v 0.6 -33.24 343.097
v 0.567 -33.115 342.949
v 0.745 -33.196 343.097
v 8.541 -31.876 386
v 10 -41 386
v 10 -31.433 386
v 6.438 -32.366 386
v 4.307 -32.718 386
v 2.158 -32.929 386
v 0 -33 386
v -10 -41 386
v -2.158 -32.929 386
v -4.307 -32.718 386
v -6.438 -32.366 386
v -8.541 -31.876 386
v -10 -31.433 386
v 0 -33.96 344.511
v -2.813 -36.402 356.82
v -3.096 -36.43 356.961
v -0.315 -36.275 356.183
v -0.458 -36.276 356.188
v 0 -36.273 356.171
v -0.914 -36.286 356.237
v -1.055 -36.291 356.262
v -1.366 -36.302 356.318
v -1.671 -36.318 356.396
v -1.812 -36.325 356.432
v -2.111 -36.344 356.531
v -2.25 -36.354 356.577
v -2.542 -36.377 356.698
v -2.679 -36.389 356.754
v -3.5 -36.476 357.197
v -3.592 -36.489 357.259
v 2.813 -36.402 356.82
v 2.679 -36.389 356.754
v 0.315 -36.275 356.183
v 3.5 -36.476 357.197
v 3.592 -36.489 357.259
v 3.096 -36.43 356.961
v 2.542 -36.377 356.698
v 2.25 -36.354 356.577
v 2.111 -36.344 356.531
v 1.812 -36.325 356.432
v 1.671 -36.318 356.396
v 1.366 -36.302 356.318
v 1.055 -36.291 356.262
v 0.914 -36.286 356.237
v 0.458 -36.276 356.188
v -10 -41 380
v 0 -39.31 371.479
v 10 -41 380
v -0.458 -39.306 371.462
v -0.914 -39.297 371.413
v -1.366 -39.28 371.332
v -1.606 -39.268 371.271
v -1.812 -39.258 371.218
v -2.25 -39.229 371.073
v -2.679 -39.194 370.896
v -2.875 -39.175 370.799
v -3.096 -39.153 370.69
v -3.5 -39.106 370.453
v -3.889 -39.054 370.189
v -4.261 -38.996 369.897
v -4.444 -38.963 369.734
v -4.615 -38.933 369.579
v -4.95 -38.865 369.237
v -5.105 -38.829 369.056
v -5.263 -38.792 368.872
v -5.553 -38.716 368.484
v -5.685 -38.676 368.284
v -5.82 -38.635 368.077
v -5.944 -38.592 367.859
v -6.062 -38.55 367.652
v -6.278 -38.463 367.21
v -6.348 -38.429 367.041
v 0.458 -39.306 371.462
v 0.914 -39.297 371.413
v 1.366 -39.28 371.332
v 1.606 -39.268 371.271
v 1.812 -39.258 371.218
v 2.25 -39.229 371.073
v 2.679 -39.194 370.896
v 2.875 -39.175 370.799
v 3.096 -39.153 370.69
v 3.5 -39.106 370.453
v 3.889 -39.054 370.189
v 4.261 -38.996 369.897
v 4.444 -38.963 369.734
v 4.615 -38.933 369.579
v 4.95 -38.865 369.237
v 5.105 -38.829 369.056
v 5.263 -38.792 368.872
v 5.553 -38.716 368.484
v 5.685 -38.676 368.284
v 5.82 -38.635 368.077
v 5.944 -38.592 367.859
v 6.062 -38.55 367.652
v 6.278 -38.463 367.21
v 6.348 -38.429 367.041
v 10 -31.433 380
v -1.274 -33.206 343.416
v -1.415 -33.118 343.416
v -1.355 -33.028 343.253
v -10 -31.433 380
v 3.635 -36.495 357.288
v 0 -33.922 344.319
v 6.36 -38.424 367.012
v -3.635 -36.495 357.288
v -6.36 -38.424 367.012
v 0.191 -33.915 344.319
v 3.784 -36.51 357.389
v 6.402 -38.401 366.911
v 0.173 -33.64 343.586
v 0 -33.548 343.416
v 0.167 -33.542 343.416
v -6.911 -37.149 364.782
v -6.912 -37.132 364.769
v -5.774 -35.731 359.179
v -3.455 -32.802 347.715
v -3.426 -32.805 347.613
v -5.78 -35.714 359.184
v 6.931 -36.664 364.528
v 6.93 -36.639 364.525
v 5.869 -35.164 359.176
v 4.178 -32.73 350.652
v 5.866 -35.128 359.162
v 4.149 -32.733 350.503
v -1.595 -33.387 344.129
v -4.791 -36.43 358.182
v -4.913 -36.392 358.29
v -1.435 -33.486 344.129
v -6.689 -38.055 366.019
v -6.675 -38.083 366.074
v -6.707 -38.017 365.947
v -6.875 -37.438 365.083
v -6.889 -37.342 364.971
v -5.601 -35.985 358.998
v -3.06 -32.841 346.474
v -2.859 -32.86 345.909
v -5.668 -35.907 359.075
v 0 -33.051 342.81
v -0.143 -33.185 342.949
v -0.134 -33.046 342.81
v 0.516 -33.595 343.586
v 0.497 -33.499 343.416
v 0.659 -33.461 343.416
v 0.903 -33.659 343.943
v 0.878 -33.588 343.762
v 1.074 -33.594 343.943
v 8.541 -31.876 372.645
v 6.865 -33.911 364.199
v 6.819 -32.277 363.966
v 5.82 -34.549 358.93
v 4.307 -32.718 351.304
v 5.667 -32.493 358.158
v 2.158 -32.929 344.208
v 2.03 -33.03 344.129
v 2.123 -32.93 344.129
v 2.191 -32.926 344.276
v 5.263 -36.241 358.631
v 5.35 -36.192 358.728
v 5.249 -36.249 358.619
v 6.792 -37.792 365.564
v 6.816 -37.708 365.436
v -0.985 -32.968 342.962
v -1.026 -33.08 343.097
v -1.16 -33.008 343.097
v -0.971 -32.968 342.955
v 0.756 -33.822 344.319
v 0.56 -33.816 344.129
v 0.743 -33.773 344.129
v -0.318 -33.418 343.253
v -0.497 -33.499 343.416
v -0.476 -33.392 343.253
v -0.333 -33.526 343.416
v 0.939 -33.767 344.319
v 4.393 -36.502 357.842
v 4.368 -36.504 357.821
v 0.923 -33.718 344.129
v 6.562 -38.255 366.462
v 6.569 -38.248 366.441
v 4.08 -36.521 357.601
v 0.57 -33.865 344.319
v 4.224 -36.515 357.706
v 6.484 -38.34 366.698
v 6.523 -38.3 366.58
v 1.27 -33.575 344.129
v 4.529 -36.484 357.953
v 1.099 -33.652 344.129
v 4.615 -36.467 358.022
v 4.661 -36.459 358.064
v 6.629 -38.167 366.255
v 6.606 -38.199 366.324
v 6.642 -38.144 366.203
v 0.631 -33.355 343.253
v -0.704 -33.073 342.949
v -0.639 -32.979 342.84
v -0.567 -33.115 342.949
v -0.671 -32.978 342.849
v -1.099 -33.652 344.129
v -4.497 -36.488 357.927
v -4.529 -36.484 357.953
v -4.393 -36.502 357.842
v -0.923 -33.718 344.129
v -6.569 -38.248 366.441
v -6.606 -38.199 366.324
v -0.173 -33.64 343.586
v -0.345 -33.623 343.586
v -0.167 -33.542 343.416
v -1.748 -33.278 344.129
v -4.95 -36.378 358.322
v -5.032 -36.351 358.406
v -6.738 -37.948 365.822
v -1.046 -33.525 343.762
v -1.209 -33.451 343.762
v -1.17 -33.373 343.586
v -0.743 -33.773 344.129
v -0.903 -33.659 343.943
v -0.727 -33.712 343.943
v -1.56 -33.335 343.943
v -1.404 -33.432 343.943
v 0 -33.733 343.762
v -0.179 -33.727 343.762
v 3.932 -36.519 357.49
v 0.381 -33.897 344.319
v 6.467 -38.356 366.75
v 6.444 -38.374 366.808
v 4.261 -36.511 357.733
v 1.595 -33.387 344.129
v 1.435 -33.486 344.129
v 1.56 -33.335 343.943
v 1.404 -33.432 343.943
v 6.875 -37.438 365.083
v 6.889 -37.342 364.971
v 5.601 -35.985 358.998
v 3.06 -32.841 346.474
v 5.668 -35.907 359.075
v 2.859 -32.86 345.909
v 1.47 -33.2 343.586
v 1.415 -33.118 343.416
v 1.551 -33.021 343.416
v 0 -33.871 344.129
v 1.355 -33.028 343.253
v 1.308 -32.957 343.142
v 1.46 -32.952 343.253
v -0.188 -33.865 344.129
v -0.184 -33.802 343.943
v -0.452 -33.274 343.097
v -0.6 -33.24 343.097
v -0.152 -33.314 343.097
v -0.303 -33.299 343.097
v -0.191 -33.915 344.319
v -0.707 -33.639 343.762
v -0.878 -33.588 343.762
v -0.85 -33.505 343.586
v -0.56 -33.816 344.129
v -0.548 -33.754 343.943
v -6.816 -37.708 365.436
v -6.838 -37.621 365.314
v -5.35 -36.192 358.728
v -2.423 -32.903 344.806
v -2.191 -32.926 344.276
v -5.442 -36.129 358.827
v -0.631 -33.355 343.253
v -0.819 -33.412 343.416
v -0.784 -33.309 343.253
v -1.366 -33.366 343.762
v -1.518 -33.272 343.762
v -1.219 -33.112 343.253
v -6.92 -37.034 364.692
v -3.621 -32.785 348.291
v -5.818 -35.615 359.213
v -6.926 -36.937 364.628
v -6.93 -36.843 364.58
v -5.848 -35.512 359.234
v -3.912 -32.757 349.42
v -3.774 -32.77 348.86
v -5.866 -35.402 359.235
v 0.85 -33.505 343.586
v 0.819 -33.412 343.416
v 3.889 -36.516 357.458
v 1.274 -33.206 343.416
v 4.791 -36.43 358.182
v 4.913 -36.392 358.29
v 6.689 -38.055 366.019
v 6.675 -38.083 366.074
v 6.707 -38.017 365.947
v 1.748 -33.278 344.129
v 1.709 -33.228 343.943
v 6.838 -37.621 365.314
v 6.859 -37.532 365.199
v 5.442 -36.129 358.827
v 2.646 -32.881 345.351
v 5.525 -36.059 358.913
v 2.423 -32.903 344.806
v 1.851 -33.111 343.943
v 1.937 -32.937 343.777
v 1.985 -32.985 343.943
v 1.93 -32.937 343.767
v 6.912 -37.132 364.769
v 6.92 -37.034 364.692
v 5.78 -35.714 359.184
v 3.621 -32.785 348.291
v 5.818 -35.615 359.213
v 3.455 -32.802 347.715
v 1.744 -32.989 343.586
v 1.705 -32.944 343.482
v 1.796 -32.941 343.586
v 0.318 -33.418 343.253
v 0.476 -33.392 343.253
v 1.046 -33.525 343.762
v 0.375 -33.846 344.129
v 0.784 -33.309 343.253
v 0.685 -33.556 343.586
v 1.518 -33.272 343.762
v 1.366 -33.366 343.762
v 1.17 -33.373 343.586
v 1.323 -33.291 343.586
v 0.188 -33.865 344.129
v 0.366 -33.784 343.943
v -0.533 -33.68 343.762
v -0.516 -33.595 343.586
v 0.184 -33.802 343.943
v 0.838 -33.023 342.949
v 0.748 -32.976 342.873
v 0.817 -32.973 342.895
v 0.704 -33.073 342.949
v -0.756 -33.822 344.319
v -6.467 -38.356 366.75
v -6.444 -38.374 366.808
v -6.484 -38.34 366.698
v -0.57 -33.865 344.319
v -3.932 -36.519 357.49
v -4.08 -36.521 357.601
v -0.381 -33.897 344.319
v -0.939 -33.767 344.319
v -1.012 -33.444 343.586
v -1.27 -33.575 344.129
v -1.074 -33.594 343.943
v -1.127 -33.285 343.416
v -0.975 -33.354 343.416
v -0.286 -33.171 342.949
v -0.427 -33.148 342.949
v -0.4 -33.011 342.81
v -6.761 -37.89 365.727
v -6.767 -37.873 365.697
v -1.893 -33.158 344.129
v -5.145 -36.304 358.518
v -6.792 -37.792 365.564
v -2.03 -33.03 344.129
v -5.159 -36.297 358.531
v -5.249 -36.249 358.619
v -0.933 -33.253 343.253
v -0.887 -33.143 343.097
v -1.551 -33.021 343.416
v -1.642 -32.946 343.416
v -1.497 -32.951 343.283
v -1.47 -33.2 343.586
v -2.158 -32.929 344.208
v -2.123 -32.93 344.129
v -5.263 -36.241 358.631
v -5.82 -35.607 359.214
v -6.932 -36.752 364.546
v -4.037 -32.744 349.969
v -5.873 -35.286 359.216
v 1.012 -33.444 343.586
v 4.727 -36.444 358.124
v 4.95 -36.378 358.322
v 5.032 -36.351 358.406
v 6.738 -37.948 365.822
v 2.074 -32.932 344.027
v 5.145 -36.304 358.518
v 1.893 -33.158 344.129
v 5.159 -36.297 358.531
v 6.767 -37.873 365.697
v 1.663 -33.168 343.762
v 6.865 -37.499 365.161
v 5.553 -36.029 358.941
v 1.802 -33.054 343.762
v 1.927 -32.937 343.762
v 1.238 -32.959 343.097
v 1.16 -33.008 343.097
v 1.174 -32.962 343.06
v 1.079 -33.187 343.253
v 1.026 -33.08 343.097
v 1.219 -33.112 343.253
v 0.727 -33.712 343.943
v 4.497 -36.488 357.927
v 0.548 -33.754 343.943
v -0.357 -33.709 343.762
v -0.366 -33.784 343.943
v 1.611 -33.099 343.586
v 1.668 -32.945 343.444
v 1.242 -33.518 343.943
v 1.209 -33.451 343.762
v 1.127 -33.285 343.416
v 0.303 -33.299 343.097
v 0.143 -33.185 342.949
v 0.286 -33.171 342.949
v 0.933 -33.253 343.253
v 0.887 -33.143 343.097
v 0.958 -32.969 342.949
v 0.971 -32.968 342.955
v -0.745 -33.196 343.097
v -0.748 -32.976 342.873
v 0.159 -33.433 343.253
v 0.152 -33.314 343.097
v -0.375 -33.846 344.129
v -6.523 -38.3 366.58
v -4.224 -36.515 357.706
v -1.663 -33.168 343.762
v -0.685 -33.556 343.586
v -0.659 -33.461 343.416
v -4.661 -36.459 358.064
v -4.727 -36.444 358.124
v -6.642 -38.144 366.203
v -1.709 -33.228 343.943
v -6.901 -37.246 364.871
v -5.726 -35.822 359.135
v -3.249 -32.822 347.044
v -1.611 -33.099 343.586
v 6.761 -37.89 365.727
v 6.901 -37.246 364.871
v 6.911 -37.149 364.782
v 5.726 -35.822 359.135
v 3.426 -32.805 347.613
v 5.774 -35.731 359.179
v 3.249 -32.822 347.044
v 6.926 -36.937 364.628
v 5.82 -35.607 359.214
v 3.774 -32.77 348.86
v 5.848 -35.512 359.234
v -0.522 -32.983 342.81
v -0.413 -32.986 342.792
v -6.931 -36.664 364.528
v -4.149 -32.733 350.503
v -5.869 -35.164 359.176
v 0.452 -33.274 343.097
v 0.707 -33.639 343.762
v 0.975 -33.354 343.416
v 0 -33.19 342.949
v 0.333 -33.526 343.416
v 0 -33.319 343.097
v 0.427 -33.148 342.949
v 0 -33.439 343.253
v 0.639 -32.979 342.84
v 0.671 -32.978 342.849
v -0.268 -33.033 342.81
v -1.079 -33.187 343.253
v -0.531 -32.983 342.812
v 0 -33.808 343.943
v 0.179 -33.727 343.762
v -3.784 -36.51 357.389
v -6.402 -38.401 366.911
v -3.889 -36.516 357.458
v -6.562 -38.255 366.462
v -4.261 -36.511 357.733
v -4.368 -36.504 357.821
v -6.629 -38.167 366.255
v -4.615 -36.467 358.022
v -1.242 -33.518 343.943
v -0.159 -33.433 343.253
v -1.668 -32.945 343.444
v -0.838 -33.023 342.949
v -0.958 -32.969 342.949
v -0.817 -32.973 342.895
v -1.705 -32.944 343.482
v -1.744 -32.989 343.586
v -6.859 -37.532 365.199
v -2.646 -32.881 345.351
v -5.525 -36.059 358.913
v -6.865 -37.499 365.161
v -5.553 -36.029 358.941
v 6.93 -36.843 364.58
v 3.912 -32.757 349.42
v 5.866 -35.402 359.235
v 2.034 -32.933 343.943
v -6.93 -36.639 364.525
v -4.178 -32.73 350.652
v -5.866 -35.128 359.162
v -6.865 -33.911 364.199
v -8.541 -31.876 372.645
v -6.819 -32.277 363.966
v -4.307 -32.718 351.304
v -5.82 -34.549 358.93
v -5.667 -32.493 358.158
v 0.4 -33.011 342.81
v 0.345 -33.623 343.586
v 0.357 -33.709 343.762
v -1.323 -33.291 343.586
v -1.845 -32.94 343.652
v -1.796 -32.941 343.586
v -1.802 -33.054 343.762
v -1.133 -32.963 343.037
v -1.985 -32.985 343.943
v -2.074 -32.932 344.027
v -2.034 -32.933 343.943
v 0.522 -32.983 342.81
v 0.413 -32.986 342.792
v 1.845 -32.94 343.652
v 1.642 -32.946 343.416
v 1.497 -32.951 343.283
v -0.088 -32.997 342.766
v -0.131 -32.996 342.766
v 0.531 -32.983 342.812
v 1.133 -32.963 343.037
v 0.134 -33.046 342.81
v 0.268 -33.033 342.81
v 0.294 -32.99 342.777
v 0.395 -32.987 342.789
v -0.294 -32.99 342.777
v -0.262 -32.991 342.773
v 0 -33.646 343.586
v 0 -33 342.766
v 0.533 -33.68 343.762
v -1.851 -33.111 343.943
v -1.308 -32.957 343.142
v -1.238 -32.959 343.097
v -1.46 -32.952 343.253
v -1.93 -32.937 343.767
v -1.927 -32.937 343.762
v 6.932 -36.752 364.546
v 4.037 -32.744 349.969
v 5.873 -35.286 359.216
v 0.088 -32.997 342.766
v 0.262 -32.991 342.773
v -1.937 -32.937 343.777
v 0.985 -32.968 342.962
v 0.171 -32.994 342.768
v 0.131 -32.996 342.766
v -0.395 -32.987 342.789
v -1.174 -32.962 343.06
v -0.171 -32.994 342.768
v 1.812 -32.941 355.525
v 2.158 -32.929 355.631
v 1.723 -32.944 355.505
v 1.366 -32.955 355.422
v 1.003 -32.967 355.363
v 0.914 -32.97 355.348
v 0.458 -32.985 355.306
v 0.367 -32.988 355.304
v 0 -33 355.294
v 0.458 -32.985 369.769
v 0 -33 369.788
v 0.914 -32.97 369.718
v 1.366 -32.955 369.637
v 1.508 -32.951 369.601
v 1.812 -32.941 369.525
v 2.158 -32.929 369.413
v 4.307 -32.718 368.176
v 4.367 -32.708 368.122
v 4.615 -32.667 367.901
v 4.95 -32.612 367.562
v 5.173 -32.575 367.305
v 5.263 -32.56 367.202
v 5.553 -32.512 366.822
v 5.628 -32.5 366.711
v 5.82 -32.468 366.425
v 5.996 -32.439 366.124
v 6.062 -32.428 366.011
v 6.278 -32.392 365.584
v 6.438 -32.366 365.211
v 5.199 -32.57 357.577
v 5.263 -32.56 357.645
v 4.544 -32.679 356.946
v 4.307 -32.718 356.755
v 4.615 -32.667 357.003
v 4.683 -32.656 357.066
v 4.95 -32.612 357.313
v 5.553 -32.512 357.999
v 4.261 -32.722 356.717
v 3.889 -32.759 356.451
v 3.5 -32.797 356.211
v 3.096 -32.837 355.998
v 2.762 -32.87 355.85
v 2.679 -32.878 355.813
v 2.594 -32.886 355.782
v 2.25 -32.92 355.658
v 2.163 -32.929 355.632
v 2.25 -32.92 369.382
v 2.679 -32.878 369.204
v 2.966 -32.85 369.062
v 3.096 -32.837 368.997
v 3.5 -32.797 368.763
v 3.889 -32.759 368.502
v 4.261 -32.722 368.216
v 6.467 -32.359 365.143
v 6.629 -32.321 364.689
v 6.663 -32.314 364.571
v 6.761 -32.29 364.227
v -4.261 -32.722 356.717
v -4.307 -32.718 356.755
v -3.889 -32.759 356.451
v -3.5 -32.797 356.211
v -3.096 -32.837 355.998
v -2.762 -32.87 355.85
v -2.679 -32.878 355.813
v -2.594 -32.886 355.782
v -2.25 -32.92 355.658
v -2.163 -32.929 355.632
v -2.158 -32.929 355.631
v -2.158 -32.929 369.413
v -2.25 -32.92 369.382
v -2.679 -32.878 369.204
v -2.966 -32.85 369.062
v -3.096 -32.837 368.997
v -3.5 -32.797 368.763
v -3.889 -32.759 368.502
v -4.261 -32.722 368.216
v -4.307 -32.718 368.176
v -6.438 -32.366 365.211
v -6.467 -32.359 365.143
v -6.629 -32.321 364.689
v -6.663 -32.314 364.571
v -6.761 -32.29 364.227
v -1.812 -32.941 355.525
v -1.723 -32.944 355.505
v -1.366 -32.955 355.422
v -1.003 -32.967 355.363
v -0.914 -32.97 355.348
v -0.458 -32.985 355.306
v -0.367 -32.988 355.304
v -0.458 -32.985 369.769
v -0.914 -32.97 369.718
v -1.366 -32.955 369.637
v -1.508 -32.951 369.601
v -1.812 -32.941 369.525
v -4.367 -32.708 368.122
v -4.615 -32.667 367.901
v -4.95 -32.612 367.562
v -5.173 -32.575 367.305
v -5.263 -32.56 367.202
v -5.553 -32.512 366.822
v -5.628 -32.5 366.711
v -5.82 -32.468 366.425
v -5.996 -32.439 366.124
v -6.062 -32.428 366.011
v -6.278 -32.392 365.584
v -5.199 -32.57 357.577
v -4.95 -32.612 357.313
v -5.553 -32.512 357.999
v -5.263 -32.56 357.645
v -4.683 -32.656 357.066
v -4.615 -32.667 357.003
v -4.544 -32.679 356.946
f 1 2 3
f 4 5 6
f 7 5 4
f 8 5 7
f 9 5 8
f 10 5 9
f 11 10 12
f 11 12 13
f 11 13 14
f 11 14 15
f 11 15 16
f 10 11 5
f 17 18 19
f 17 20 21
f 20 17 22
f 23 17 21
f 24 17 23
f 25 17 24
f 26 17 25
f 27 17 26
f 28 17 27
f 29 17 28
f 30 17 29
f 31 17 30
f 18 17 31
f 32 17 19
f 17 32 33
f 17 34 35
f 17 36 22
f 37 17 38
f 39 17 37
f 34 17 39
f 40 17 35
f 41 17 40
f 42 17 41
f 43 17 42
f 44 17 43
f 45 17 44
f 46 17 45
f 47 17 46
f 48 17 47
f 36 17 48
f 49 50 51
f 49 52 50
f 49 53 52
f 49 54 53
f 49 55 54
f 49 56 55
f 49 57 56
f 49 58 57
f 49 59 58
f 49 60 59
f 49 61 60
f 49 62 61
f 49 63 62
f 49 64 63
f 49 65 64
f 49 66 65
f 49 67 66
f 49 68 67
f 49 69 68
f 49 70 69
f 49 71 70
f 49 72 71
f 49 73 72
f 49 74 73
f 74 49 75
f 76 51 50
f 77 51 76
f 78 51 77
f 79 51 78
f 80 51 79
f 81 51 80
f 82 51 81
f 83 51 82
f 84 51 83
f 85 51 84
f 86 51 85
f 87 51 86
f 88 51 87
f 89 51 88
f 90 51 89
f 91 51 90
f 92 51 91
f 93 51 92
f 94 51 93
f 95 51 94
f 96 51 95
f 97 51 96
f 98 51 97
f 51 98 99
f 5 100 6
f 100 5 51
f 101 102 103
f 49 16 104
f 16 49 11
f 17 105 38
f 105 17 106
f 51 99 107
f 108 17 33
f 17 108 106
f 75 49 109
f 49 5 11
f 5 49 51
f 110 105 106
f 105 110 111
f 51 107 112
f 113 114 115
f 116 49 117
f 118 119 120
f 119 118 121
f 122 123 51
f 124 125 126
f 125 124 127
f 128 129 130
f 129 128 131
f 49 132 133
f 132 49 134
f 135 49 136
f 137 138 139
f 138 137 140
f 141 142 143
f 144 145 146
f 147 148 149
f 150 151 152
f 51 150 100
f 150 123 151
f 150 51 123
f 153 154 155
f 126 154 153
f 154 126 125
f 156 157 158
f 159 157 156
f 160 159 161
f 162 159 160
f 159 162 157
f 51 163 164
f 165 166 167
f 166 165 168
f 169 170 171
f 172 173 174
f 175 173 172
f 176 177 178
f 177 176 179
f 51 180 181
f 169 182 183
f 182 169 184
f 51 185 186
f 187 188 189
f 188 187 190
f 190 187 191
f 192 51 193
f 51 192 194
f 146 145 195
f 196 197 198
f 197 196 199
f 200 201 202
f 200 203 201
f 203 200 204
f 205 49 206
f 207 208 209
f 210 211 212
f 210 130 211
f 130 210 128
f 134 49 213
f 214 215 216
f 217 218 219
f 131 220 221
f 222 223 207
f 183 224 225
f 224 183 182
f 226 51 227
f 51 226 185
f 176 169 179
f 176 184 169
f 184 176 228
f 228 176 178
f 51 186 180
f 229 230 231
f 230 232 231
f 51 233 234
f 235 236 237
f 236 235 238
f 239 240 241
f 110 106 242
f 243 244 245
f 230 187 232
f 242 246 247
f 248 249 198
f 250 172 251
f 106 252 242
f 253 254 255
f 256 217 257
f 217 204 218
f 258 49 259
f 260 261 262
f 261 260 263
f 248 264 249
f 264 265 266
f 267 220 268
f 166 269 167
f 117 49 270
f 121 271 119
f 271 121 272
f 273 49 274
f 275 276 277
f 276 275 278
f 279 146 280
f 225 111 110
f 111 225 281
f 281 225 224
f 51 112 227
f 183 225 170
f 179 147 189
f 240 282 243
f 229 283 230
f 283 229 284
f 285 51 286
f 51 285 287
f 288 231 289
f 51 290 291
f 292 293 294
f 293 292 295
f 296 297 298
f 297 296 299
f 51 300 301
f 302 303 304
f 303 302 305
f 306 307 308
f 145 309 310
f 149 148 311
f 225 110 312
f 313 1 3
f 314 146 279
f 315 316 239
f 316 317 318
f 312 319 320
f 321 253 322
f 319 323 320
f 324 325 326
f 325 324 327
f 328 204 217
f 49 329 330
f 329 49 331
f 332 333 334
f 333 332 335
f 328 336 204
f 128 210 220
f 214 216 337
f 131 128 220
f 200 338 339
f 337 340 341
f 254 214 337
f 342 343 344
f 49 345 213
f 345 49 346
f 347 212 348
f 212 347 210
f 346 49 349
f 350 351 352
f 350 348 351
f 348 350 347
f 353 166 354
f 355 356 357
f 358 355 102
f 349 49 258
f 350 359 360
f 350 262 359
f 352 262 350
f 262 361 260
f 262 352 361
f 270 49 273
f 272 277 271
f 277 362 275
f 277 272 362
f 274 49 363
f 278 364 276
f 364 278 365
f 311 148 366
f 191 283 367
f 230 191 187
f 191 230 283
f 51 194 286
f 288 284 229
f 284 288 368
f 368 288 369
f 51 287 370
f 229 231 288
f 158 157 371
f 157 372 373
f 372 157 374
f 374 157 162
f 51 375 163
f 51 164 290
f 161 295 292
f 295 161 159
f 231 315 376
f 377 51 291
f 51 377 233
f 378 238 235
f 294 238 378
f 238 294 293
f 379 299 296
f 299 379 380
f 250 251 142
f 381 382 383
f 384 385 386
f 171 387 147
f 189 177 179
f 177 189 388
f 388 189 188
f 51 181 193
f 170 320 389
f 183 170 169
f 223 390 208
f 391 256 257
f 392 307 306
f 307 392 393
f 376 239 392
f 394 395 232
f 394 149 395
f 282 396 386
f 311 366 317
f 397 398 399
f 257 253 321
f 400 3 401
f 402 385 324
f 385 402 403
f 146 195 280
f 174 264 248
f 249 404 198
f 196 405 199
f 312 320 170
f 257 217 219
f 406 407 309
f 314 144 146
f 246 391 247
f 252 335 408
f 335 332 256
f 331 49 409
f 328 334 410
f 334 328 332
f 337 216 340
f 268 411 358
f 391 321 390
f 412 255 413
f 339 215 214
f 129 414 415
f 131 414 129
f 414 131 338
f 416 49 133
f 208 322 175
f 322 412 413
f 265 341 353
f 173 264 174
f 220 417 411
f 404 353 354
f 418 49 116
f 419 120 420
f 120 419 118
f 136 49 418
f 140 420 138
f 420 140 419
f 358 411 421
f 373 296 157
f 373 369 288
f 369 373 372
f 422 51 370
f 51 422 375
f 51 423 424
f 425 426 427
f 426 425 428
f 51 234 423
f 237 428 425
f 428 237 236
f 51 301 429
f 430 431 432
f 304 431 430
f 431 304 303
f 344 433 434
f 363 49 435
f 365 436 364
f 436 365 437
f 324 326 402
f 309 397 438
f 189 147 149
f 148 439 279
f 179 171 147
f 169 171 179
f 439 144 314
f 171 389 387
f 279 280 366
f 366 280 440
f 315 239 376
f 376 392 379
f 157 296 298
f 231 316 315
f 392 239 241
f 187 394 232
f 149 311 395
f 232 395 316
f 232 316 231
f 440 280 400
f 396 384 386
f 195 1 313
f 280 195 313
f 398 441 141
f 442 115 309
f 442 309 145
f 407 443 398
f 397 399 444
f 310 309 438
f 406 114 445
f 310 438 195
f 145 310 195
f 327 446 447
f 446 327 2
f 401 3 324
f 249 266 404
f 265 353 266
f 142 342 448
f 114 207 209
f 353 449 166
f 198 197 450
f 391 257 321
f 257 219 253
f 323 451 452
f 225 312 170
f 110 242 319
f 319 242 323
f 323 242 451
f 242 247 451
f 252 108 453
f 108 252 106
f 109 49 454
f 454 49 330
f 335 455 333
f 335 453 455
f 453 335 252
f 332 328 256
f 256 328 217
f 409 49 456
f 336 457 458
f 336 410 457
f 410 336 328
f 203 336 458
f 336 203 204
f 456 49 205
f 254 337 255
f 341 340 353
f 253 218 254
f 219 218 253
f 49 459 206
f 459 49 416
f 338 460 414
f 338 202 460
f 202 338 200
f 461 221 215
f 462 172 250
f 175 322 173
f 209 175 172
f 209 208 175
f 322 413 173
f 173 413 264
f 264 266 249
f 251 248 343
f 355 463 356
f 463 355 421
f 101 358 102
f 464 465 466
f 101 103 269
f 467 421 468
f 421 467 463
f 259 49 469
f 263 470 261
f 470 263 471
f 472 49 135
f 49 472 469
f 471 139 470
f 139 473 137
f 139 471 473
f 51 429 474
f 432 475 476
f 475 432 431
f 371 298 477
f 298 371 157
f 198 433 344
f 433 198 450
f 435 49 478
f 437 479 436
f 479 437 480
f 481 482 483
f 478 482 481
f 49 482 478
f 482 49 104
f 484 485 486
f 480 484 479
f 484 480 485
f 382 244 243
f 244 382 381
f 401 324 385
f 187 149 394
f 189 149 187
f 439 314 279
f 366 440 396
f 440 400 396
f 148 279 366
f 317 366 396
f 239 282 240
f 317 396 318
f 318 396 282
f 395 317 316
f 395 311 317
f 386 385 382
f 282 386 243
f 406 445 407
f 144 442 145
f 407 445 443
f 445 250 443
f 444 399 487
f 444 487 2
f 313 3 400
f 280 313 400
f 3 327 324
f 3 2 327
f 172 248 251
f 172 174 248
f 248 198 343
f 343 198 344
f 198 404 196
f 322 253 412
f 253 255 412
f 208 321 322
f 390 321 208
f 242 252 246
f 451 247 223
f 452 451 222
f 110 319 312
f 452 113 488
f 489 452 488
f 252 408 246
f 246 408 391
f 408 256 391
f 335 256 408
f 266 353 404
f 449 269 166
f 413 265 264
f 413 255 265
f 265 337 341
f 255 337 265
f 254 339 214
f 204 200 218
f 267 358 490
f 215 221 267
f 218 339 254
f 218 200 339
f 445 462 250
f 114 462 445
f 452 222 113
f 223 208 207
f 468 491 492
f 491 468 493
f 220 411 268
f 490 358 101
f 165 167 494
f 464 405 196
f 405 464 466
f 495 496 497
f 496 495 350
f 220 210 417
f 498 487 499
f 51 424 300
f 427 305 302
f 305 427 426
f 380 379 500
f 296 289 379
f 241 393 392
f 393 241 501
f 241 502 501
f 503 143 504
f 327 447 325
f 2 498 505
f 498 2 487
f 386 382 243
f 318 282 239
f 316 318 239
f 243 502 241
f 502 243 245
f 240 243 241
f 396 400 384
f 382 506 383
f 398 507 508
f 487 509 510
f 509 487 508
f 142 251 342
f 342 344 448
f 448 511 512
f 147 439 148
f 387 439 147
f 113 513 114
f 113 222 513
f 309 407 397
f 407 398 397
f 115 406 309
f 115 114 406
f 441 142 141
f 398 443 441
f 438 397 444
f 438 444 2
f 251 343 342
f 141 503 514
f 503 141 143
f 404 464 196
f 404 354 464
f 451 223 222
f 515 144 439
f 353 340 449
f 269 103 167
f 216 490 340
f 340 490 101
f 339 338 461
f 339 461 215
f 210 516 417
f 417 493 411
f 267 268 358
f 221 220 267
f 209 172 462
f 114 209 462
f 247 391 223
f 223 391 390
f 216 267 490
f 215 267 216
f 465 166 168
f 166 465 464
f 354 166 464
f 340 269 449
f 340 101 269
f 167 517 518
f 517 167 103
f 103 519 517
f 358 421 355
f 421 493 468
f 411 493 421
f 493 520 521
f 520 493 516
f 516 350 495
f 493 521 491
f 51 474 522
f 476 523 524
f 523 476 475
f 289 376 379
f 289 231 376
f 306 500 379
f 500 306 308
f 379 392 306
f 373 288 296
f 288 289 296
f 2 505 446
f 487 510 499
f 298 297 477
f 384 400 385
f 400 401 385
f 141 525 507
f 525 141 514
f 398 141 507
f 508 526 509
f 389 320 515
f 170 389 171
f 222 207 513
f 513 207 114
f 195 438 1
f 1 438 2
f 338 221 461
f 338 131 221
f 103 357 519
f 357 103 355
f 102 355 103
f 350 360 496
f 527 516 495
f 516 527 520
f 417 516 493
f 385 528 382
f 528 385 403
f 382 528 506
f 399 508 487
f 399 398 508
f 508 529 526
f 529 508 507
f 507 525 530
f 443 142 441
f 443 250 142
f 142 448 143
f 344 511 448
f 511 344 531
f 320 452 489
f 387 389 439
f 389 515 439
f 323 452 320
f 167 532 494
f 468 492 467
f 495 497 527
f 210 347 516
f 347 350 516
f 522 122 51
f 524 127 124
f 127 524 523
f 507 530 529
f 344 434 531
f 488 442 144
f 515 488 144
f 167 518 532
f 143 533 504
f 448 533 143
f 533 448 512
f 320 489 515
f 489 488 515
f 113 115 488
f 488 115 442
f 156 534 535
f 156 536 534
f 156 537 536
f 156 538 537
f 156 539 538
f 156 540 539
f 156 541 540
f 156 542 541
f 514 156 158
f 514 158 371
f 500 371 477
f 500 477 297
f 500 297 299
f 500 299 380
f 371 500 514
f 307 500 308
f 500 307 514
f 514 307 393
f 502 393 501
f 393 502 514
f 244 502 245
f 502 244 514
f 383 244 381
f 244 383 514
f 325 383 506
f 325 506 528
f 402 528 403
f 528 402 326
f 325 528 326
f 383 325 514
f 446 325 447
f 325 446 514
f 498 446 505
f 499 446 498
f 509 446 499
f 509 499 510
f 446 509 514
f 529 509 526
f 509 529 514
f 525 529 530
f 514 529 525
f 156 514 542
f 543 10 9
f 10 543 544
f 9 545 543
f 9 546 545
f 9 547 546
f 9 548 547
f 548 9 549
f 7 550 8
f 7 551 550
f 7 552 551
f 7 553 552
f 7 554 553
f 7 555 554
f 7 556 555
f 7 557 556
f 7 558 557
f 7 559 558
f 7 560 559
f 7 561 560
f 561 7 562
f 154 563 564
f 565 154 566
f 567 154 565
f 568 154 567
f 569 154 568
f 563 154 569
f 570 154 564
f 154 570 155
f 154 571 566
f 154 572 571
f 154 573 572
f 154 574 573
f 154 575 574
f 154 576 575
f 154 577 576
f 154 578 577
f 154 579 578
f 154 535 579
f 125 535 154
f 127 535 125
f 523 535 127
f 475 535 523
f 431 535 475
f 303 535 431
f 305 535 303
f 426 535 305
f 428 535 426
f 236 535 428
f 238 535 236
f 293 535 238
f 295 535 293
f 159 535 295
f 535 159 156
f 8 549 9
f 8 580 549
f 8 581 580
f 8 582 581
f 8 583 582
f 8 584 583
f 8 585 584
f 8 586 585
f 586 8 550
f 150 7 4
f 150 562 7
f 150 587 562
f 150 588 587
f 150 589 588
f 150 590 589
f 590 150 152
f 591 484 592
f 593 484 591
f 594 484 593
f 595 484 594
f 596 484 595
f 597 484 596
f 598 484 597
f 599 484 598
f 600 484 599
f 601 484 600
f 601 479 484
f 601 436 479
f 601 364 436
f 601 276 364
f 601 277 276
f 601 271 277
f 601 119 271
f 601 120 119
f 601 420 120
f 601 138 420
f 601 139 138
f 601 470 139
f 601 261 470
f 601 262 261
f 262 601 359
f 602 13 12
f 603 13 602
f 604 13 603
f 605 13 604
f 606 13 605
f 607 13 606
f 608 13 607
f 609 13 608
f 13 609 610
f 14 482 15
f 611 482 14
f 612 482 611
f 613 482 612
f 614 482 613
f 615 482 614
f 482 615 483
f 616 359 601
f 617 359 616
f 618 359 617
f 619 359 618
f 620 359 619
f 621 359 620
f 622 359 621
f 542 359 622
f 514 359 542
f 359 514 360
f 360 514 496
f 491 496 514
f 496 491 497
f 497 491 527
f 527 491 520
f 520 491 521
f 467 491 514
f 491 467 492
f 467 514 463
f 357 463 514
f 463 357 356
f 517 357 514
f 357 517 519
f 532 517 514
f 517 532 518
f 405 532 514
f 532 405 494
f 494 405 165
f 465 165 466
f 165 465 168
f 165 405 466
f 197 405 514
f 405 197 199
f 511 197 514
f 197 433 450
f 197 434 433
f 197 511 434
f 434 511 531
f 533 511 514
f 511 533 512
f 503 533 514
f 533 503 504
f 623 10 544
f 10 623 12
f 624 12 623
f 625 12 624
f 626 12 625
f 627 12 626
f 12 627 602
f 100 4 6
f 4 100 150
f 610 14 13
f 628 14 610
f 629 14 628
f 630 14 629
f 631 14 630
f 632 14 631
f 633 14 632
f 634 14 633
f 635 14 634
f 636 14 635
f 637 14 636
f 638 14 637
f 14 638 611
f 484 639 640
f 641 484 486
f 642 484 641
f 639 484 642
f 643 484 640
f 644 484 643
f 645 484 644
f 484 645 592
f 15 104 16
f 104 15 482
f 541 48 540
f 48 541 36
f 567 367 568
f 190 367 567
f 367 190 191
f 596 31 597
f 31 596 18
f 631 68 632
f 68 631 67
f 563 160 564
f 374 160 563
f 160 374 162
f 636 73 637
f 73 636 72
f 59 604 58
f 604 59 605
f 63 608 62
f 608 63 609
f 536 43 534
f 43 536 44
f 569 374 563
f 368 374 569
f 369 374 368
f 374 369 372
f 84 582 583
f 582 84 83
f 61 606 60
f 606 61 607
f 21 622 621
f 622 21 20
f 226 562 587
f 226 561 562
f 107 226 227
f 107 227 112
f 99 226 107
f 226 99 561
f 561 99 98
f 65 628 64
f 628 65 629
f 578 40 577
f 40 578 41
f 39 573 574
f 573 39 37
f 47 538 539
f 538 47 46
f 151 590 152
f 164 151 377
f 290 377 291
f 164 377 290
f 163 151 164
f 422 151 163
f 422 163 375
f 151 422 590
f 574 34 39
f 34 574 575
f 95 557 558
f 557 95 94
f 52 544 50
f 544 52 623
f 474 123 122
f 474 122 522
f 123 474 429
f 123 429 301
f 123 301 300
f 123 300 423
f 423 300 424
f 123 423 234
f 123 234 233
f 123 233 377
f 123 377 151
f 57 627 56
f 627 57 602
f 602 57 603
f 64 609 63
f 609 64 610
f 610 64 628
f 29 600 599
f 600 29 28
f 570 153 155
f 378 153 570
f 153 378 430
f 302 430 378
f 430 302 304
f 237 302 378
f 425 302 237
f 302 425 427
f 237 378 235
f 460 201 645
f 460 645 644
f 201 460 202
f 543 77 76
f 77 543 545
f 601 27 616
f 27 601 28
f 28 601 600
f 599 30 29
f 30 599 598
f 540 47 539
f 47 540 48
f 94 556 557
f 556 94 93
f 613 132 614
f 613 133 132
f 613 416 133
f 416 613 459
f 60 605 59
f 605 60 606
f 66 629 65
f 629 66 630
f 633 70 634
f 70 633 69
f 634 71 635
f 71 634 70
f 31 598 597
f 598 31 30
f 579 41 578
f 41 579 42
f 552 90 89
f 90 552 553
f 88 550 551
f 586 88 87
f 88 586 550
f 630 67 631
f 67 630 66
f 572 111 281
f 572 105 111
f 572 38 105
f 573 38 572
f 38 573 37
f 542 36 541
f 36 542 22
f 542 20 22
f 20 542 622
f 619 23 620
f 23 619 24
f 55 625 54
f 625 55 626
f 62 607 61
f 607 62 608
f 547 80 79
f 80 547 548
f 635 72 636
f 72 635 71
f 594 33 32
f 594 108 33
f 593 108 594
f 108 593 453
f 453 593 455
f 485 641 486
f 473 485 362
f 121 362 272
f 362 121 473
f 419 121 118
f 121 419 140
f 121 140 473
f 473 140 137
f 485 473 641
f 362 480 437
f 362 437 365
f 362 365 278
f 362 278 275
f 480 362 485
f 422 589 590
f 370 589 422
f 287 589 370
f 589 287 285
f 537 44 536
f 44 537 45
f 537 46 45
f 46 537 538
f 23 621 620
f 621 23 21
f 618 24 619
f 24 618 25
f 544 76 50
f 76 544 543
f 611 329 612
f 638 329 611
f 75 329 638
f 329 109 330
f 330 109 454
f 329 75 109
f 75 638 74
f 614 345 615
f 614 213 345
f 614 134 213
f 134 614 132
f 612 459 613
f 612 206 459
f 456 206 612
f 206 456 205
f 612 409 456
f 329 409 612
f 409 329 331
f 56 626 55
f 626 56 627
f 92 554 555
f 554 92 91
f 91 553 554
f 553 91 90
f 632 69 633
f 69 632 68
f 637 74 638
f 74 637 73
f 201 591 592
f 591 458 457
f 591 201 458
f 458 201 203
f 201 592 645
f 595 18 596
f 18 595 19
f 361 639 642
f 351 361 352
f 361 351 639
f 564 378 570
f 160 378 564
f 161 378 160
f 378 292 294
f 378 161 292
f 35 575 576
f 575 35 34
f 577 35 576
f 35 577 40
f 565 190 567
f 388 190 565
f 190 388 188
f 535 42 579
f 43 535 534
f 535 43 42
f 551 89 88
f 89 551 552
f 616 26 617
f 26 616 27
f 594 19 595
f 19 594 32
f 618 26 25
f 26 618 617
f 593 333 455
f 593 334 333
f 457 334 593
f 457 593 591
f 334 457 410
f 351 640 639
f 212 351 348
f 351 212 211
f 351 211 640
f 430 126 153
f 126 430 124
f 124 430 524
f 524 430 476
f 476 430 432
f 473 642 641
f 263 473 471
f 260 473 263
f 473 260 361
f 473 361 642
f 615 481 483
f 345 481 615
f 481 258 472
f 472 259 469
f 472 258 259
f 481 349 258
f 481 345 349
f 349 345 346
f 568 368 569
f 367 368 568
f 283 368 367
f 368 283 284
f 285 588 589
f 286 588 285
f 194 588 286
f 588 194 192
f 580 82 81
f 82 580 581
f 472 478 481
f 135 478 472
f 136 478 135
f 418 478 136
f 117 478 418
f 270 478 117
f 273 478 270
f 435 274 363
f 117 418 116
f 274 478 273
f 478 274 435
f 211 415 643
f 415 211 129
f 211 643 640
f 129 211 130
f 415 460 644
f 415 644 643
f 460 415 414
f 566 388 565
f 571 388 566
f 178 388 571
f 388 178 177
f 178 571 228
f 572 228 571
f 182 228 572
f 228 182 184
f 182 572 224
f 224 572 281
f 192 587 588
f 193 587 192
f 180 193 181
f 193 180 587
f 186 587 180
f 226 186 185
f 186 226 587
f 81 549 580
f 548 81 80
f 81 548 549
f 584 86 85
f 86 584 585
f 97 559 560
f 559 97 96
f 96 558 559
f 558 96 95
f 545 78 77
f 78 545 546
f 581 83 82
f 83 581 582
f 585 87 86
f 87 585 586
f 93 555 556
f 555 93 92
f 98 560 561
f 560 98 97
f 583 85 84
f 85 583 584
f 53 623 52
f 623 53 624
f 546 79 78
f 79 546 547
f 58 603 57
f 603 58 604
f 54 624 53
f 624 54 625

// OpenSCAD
// file: ../lib/astra66_core.scad
// =============================================================================
// ASTRA-66 CAD rev B -- core library
// Parameters (generated from analysis.py by build.py), derived stations and helpers.
// Every part file includes this; stations mirror analysis.py X[] exactly.
//
// Frame: rocket axis = +Z, STA 0 = nose tip, stations increase aft.
// Angles: measured about +Z from +X toward +Y.  90 deg = switch / hatch side,
// 270 deg = camera side, 45 deg = rail-button line, fins at 0/90/180/270 deg.
// =============================================================================
include <../astra66_params.scad>

$fn = FN;
EPS = 0.01;
CAD_REV = "B";

// ----------------------------------------------------------------- radii
R_OD    = BODY_OD / 2;                 // body tube outer
R_ID    = BODY_ID / 2;                 // body tube inner
R_SH    = (BODY_ID - FIT_SH) / 2;      // printed shoulder / ring OD radius
R_SI    = R_SH - NC_SH_WALL;           // nose shoulder inner radius
R_CO    = CPL_OD / 2;                  // coupler outer
R_CI    = CPL_ID / 2;                  // coupler inner
R_BH_IN = (CPL_ID - 0.2) / 2;          // inner bulkhead disc (fits in coupler)
R_MO    = MMT_OD / 2;
R_MI    = MMT_ID / 2;
R_RING_BORE = (MMT_OD + FIT_SH) / 2;   // centering-ring / core bore
R_TAB_FLOOR = max(R_MO, RET_CLEAR_D / 2);          // rev B: tab clears the COTS retainer
FIN_TAB_H   = R_OD - R_TAB_FLOOR - FIN_TAB_CLR;

// ----------------------------------------------------------------- stations
X_NC_BASE     = NC_L;
X_SH_END      = NC_L + NC_SH_L;
X_PL_END      = NC_L + PL_L;
X_BAND_END    = X_PL_END + AV_BAND_L;
X_END         = X_BAND_END + BO_L;
L_OVERALL     = X_END;                              // airframe length (excl. COTS retainer)
X_CPL_FWD     = X_PL_END - AV_INS;
X_CPL_AFT     = X_BAND_END + AV_INS;
X_AVB_FWD_OUT = X_CPL_FWD - AV_BH_T;                // AV-303 forward face
X_AVB_AFT_OUT = X_CPL_AFT + GASKET_T;               // AV-304 outer-disc forward face
X_AVB_AFT_END = X_AVB_AFT_OUT + AV_BH_T;            // AV-304 aft face (recovery bay starts)
X_SLED_FWD    = X_CPL_FWD + AV_BH_T + SLED_FWD_GAP;
X_SLED_AFT    = X_SLED_FWD + SLED_L;
X_MMT_AFT     = X_END + MMT_AFT_EXT;
X_MMT_FWD     = X_MMT_AFT - MMT_L;
X_FIN_LE      = X_END - FIN_CR;
X_TAB_FWD     = X_FIN_LE + FIN_TAB_FWD;
X_TAB_AFT     = X_END - LOCK_T;
X_CORE_FWD    = X_TAB_FWD - CORE_RING_T;
X_CORE_AFT    = X_END - LOCK_T;
X_NC_SCREW    = NC_L + NC_SH_L / 2;
X_CAM         = X_SH_END + CAM_OFF;
X_HATCH       = X_SH_END + HATCH_OFF;
X_RB_FWD      = X_MMT_FWD - RB_FWD_OFF;
X_RB_AFT      = X_END - RB_AFT_OFF;
X_TRAY_FWD    = X_AVB_FWD_OUT - TRAY_L;
X_SW          = X_PL_END + AV_BAND_L / 2;
X_MOTOR_FWD   = X_MMT_AFT - MOTOR_L;
X_BAT0        = X_SLED_FWD + 2;
BAT_CAGE_L    = 12 + BAT_L + 0.6;
PAYLOAD_BAY_L  = X_AVB_FWD_OUT - X_SH_END;
RECOVERY_BAY_L = X_MMT_FWD - X_AVB_AFT_END;

FIN_ANGLES      = [for (i = [0 : FIN_N - 1]) i * 360 / FIN_N];
LOCK_SCREW_ANG  = [45, 135, 225, 315];
STATIC_PORT_ANG = [45, 135, 225, 315];

// ----------------------------------------------------------------- geometry helpers
function ogive_rho()  = (R_OD * R_OD + NC_L * NC_L) / (2 * R_OD);
function ogive_r(x)   = sqrt(max(pow(ogive_rho(), 2) - pow(NC_L - x, 2), 0)) + R_OD - ogive_rho();

// Solid of revolution of the tangent ogive between stations x0..x1, radially offset inward by off.
module ogive_solid(x0, x1, off = 0, n = 72) {
    s = (x0 == 0) ? 1 : 0;
    rotate_extrude()
        polygon(concat([[0, x0]],
                       [for (i = [s : n]) let(x = x0 + (x1 - x0) * i / n) [max(ogive_r(x) - off, 0.01), x]],
                       [[0, x1]]));
}

module tube_r(ro, ri, z0, z1) {
    translate([0, 0, z0]) difference() {
        cylinder(r = ro, h = z1 - z0);
        translate([0, 0, -1]) cylinder(r = ri, h = z1 - z0 + 2);
    }
}

module at_angle(a) { rotate([0, 0, a]) children(); }

// Cylinder of diameter d along the radial direction at angle a, from radius r0 to r1, at station z.
module radial_cyl(d, z, a, r0, r1) {
    at_angle(a) translate([r0, 0, z]) rotate([0, 90, 0]) cylinder(d = d, h = r1 - r0);
}

module rounded_rect(l, w, r) { offset(r = r) square([l - 2 * r, w - 2 * r], center = true); }

// Radial prism with a rounded-rectangle footprint (l axial x w tangential) centred at station z.
module radial_prism(a, z, l, w, rr, r0, r1) {
    at_angle(a) translate([r0, 0, z]) rotate([0, 90, 0]) linear_extrude(r1 - r0) rounded_rect(l, w, rr);
}

// Block in the radial frame at angle a: radial r0..r1, tangential +/-hw, stations z0..z1, clipped to radius rc.
module radial_block(a, r0, r1, hw, z0, z1, rc) {
    intersection() {
        at_angle(a) translate([r0, -hw, z0]) cube([r1 - r0, 2 * hw, z1 - z0]);
        translate([0, 0, z0 - 1]) cylinder(r = rc, h = z1 - z0 + 2);
    }
}

// Camera frame: child +Z = lens axis (outward, tilted CAM_TILT aft), origin at the lens face centre.
// Lens-face radius CAM_R0 is the smaller of (a) the tilted barrel rim 0.5 mm inside the bore and
// (b) the tilted camera-body corners 0.5 mm inside the bore -- so any CAM_W/CAM_LEN entered fits.
CAM_SETBACK = CAM_LENS_L * cos(CAM_TILT) + (CAM_LENS_HOLE - 1) / 2 * sin(CAM_TILT) + 0.5;
CAM_R0 = min(R_ID - CAM_SETBACK, sqrt(pow(R_ID - 0.5, 2) - pow(CAM_W / 2, 2)) - CAM_LEN / 2 * sin(CAM_TILT));
module cam_frame() {
    at_angle(CAM_ANG) translate([CAM_R0, 0, X_CAM]) rotate([0, 90 - CAM_TILT, 0]) children();
}

echo(str("ASTRA-66 CAD rev ", CAD_REV, ": L_OVERALL=", L_OVERALL, " payload bay=", PAYLOAD_BAY_L,
         " recovery bay=", RECOVERY_BAY_L, " fin tab depth=", FIN_TAB_H));
// main file
// ASTRA-66 CAD rev B -- PL-204 Lens cowl
// Teardrop fairing (about 44 x 20 x 8 mm) over the lens hole, saddle = body OD, window bore along the
// tilted lens axis. ASA or PETG, FDM. Bonded to PL-201 and faired with filler.
include <../lib/astra66_core.scad>

module PL_204_lens_cowl() {
    difference() {
        at_angle(CAM_ANG) hull() {
            translate([R_OD - 2, 0, X_CAM - 15]) sphere(r = 3);
            translate([R_OD - 2, -10, X_CAM + 20]) cube([10, 20, 6]);
        }
        translate([0, 0, X_CAM - 40]) cylinder(r = R_OD, h = 90);
        cam_frame() translate([0, 0, CAM_LENS_L - 3]) cylinder(d = CAM_LENS_HOLE, h = 30);
    }
}

PL_204_lens_cowl();
